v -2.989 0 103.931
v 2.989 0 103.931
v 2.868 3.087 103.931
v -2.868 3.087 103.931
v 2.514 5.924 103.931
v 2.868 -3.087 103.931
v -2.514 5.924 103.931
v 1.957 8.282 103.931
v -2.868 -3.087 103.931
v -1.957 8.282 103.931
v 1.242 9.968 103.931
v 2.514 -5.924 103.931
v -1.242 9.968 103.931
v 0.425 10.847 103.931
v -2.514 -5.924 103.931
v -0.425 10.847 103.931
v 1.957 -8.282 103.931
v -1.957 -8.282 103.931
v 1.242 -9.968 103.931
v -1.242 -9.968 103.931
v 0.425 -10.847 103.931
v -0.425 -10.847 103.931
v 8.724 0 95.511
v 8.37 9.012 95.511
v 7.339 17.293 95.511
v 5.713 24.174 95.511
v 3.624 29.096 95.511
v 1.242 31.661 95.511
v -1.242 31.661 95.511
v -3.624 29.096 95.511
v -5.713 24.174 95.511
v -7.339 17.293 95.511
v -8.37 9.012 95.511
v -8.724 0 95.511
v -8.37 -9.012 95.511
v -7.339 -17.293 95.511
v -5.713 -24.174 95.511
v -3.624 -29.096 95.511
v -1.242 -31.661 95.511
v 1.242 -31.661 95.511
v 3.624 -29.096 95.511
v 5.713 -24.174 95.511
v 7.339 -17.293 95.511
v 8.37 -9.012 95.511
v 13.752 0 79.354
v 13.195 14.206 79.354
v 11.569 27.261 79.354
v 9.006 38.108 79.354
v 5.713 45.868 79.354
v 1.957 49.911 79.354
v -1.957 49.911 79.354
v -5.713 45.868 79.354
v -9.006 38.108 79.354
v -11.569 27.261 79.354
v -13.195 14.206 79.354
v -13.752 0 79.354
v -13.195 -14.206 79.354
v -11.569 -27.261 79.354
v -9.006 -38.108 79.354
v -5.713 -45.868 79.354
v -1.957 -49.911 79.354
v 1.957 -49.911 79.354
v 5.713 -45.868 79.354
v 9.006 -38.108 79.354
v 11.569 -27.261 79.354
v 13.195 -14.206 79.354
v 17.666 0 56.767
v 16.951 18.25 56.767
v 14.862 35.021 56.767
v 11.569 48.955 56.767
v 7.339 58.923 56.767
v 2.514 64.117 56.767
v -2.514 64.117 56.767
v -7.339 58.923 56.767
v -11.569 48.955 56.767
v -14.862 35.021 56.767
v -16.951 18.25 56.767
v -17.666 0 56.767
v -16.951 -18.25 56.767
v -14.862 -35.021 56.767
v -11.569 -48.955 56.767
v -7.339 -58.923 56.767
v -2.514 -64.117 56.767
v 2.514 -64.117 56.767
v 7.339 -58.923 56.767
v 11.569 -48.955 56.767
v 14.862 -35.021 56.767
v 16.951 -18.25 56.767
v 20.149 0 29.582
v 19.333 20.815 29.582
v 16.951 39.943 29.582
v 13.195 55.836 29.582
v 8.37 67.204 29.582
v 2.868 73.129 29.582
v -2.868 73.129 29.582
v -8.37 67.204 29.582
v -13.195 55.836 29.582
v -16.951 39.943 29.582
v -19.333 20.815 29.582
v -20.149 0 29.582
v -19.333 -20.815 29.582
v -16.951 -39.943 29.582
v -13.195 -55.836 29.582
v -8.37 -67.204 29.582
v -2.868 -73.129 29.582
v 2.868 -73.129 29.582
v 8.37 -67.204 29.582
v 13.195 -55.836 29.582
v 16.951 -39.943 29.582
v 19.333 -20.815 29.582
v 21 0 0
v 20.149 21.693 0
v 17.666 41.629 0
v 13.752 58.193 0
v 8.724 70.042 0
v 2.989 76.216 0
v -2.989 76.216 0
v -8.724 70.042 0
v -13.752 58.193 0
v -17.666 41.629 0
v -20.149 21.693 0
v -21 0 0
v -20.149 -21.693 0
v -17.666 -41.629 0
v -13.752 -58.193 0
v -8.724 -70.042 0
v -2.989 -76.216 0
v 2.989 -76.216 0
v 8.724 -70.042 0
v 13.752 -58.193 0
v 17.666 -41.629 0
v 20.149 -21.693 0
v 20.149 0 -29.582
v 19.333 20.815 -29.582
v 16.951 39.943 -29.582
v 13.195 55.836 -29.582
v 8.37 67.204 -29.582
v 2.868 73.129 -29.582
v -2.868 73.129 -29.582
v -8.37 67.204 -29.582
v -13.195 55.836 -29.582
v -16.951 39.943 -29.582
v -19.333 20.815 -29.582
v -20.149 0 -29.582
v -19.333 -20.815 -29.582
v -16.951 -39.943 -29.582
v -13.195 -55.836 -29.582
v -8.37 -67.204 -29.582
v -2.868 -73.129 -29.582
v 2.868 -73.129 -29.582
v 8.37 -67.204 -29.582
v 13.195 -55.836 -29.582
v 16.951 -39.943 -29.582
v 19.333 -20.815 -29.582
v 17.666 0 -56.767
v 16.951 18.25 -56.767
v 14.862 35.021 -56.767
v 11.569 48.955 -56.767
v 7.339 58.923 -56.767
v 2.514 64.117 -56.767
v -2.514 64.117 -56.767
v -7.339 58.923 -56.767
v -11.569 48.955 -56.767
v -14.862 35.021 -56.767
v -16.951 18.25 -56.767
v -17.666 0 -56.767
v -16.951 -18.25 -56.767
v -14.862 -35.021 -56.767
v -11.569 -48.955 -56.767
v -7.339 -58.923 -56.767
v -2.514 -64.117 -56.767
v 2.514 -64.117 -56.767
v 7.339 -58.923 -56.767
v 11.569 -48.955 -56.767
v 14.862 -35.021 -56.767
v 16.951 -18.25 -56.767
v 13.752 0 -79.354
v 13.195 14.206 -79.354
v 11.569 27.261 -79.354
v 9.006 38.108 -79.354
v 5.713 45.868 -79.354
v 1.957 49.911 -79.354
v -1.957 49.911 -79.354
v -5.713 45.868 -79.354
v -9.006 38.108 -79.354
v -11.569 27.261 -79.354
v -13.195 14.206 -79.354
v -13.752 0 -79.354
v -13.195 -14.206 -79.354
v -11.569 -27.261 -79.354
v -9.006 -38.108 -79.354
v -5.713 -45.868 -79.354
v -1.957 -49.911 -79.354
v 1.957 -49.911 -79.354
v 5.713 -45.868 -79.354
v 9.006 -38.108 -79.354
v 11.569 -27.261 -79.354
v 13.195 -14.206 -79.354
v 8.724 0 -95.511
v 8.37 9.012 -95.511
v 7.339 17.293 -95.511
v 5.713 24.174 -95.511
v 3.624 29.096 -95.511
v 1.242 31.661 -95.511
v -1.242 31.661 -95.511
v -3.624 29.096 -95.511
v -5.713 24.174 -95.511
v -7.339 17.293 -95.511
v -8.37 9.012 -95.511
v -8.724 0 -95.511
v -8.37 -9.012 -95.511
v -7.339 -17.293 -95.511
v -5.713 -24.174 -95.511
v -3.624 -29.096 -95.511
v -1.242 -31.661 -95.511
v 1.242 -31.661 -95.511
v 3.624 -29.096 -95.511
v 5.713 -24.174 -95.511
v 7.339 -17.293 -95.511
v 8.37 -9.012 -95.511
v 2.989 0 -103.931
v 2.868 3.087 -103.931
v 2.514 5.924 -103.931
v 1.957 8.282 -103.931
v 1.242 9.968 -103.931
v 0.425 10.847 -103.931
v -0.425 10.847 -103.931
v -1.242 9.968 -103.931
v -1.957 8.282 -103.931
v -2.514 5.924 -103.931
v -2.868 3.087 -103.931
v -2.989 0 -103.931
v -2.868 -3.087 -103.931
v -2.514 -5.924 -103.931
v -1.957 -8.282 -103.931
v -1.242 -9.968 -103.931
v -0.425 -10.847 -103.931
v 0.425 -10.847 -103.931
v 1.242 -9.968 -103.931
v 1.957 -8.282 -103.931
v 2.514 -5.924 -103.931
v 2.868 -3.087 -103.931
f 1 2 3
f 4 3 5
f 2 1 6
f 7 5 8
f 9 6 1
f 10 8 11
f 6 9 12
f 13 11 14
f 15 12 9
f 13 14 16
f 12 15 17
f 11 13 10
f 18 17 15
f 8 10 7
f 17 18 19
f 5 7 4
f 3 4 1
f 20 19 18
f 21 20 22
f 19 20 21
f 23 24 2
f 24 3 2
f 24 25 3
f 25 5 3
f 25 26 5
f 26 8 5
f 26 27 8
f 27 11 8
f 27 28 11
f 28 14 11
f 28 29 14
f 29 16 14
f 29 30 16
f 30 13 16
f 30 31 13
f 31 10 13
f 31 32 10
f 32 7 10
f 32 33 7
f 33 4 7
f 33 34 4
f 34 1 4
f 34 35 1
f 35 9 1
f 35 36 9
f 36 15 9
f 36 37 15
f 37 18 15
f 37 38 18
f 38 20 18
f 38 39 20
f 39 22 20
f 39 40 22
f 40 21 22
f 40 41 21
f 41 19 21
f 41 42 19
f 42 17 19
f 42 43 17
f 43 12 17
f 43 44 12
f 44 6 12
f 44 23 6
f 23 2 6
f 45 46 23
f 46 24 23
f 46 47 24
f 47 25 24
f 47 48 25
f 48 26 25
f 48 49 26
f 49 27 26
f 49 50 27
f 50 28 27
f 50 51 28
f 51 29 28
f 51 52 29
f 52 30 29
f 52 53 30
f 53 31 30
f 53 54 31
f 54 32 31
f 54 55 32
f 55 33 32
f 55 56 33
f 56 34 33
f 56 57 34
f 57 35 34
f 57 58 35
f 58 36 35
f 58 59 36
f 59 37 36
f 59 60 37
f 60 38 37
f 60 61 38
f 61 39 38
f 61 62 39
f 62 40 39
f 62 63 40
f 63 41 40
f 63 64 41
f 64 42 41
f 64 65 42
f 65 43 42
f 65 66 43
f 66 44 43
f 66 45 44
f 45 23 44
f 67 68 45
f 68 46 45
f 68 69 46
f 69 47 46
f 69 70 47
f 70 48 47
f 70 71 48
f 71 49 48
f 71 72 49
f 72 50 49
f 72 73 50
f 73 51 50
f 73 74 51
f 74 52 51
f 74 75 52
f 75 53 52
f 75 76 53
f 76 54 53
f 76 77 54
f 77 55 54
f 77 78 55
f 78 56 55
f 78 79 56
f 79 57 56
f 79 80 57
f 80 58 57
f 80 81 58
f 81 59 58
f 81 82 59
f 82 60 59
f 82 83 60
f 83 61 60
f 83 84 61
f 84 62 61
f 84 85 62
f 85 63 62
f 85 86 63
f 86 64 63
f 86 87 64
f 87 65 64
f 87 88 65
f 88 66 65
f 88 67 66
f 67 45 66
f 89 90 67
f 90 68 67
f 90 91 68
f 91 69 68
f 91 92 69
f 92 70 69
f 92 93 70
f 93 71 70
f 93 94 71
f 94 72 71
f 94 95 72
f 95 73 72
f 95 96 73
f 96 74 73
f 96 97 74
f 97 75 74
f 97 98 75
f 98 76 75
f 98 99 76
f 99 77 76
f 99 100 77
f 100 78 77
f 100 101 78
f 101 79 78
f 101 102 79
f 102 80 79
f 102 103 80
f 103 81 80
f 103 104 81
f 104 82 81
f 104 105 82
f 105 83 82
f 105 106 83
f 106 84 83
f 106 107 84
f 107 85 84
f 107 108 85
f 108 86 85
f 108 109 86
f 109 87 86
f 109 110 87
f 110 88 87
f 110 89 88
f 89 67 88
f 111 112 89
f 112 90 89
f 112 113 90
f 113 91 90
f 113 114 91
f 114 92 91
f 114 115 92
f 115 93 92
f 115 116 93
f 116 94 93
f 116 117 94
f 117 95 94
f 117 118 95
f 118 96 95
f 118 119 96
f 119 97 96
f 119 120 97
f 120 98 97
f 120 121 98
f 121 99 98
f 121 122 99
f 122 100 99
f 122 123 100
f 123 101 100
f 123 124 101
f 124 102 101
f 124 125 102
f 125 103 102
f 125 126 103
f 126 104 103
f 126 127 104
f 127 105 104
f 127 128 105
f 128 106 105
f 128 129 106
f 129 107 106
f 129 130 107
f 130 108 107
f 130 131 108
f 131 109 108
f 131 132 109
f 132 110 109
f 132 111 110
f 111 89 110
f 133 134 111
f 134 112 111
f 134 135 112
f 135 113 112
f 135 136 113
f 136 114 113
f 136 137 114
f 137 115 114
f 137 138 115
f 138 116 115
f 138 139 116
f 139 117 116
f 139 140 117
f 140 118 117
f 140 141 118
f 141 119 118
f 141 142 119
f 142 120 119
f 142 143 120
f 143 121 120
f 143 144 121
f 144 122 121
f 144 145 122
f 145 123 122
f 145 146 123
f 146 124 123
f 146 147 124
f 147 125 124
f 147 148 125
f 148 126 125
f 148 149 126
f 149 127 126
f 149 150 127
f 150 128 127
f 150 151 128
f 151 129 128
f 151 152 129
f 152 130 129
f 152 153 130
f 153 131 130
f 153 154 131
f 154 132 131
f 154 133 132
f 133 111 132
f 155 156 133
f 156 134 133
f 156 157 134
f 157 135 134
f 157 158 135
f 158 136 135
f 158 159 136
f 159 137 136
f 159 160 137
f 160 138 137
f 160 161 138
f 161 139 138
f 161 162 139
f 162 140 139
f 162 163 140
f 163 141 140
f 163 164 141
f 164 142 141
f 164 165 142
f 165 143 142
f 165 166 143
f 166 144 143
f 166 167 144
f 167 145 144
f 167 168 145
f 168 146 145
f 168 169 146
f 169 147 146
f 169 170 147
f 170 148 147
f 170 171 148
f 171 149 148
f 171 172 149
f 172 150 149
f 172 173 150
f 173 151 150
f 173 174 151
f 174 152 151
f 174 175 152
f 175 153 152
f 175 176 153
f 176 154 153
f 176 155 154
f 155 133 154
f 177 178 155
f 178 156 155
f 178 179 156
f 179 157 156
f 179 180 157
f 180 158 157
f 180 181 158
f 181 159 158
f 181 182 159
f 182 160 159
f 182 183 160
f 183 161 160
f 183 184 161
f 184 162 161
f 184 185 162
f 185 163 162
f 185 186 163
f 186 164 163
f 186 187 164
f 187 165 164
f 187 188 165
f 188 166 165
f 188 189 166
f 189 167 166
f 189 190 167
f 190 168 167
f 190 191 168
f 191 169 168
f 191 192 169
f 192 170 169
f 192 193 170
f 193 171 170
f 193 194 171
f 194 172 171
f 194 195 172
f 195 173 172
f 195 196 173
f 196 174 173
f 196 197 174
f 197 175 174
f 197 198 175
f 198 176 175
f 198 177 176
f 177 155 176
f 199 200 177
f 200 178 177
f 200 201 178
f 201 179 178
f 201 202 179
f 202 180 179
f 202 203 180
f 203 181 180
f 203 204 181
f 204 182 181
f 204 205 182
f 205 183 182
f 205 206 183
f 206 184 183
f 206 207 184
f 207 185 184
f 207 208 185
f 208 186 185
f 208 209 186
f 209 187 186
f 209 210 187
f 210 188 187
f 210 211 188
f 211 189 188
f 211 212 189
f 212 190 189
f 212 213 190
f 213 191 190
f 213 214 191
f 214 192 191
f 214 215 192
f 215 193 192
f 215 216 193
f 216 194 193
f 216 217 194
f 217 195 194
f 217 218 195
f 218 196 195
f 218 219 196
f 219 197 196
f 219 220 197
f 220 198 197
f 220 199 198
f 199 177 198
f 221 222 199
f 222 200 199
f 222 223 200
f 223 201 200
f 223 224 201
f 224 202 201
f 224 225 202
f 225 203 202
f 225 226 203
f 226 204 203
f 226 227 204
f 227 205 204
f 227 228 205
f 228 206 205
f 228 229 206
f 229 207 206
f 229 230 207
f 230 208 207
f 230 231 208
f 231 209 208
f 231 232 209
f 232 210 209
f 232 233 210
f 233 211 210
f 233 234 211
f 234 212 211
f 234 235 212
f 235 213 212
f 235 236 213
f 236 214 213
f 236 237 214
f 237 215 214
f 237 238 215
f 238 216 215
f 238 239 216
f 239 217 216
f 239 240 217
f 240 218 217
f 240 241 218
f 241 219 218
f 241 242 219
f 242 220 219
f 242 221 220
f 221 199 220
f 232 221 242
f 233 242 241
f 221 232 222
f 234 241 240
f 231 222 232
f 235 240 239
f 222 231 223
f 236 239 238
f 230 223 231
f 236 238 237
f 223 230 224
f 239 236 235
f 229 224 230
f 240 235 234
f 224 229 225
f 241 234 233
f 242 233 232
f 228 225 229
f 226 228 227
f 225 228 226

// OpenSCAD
// Generated by SolidPython 1.0.1 on 2020-07-29 00:46:45


scale(v = [3, 11, 15]) {
	sphere(r = 7);
}
/***********************************************
*********      SolidPython code:      **********
************************************************
 
# import packages: SolidPython
from solid import *
from solid.utils import *
from itertools import chain, combinations, permutations


class Resize:

    def __init__(self, scad_file):
        self.scad_file = scad_file
        #self.scad_file = import_scad(scad_file)
        # cone/cylinder param:
        self.r1 = 0
        self.r2 = 0
        self.h = 0
        # rectangular prism param:
        self.w = 0
        self.l = 0
        # ellipse param:
        self.r = 0

    # import OpenScad code (file name corresponds to shape)


    # classify shape + parameters
    def assign(self, param1, param2, param3):
        if self.scad_file == 'cone.scad':
            self.r1 = param1
            self.r2 = param2
            self.h = param3
        elif self.scad_file == 'cylinder.scad':
            self.r1 = param1
            self.r2 = param2
            self.h = param3
        elif self.scad_file == 'rectangularPrism.scad':
            self.h = param1
            self.l = param2
            self.w = param3
        else:
            self.r = param1
            self.h = param2

    # resize parameters
    def iterate(self):
        x = range(3, 20, 2)
        i = 1
        if self.scad_file == 'cone.scad':
            tempList = list(permutations(x, 2))
            for temp in tempList:
                param1 = temp[0]
                param2 = temp[1]
                filepath = 'produced_scad_files/' + 'cone' + str(param1) + '_' + str(param2) + '_' + '.scad'
                scad_render_to_file(cylinder(h=param1, r1=param2, r2=0), filepath)

        elif self.scad_file == 'cylinder.scad':
            tempList = list(permutations(x, 3))
            for temp in tempList:
                param1 = temp[0]
                param2 = temp[1]
                filepath = 'produced_scad_files/' + 'cylinder' + str(param1) + '_' + str(param2) + '_' + '.scad'
                scad_render_to_file(cylinder(h=param1, r1=param2, r2=param2), filepath)

        elif self.scad_file == 'rectangularPrism.scad':
            tempList = list(permutations(x, 3))
            for temp in tempList:
                param1 = temp[0]
                param2 = temp[1]
                param3 = temp[2]
                filepath = 'produced_scad_files/' + 'rectangularPrism' + str(param1) + '_' + str(param2) + '_' + str(
                    param3) + '.scad'
                scad_render_to_file(cube(size=(param1, param2, param3)), filepath)

        elif self.scad_file == 'ellipse.scad':
            tempList = list(permutations(x, 4))
            for temp in tempList:
                param1 = temp[0]
                param2 = temp[1]
                param3 = temp[2]
                param4 = temp[3]
                filepath = 'produced_scad_files/' + 'ellipse' + str(param1) + '_' + str(param2) + '_' + str(param3) + '_' + str(param4) + '.scad'
                scad_render_to_file(scale([param1, param2, param3])(sphere(r=param4)), filepath)

    def render_to_scadfile(self):
        scad_render_to_file(scad, 'example.scad') 
 
************************************************/
